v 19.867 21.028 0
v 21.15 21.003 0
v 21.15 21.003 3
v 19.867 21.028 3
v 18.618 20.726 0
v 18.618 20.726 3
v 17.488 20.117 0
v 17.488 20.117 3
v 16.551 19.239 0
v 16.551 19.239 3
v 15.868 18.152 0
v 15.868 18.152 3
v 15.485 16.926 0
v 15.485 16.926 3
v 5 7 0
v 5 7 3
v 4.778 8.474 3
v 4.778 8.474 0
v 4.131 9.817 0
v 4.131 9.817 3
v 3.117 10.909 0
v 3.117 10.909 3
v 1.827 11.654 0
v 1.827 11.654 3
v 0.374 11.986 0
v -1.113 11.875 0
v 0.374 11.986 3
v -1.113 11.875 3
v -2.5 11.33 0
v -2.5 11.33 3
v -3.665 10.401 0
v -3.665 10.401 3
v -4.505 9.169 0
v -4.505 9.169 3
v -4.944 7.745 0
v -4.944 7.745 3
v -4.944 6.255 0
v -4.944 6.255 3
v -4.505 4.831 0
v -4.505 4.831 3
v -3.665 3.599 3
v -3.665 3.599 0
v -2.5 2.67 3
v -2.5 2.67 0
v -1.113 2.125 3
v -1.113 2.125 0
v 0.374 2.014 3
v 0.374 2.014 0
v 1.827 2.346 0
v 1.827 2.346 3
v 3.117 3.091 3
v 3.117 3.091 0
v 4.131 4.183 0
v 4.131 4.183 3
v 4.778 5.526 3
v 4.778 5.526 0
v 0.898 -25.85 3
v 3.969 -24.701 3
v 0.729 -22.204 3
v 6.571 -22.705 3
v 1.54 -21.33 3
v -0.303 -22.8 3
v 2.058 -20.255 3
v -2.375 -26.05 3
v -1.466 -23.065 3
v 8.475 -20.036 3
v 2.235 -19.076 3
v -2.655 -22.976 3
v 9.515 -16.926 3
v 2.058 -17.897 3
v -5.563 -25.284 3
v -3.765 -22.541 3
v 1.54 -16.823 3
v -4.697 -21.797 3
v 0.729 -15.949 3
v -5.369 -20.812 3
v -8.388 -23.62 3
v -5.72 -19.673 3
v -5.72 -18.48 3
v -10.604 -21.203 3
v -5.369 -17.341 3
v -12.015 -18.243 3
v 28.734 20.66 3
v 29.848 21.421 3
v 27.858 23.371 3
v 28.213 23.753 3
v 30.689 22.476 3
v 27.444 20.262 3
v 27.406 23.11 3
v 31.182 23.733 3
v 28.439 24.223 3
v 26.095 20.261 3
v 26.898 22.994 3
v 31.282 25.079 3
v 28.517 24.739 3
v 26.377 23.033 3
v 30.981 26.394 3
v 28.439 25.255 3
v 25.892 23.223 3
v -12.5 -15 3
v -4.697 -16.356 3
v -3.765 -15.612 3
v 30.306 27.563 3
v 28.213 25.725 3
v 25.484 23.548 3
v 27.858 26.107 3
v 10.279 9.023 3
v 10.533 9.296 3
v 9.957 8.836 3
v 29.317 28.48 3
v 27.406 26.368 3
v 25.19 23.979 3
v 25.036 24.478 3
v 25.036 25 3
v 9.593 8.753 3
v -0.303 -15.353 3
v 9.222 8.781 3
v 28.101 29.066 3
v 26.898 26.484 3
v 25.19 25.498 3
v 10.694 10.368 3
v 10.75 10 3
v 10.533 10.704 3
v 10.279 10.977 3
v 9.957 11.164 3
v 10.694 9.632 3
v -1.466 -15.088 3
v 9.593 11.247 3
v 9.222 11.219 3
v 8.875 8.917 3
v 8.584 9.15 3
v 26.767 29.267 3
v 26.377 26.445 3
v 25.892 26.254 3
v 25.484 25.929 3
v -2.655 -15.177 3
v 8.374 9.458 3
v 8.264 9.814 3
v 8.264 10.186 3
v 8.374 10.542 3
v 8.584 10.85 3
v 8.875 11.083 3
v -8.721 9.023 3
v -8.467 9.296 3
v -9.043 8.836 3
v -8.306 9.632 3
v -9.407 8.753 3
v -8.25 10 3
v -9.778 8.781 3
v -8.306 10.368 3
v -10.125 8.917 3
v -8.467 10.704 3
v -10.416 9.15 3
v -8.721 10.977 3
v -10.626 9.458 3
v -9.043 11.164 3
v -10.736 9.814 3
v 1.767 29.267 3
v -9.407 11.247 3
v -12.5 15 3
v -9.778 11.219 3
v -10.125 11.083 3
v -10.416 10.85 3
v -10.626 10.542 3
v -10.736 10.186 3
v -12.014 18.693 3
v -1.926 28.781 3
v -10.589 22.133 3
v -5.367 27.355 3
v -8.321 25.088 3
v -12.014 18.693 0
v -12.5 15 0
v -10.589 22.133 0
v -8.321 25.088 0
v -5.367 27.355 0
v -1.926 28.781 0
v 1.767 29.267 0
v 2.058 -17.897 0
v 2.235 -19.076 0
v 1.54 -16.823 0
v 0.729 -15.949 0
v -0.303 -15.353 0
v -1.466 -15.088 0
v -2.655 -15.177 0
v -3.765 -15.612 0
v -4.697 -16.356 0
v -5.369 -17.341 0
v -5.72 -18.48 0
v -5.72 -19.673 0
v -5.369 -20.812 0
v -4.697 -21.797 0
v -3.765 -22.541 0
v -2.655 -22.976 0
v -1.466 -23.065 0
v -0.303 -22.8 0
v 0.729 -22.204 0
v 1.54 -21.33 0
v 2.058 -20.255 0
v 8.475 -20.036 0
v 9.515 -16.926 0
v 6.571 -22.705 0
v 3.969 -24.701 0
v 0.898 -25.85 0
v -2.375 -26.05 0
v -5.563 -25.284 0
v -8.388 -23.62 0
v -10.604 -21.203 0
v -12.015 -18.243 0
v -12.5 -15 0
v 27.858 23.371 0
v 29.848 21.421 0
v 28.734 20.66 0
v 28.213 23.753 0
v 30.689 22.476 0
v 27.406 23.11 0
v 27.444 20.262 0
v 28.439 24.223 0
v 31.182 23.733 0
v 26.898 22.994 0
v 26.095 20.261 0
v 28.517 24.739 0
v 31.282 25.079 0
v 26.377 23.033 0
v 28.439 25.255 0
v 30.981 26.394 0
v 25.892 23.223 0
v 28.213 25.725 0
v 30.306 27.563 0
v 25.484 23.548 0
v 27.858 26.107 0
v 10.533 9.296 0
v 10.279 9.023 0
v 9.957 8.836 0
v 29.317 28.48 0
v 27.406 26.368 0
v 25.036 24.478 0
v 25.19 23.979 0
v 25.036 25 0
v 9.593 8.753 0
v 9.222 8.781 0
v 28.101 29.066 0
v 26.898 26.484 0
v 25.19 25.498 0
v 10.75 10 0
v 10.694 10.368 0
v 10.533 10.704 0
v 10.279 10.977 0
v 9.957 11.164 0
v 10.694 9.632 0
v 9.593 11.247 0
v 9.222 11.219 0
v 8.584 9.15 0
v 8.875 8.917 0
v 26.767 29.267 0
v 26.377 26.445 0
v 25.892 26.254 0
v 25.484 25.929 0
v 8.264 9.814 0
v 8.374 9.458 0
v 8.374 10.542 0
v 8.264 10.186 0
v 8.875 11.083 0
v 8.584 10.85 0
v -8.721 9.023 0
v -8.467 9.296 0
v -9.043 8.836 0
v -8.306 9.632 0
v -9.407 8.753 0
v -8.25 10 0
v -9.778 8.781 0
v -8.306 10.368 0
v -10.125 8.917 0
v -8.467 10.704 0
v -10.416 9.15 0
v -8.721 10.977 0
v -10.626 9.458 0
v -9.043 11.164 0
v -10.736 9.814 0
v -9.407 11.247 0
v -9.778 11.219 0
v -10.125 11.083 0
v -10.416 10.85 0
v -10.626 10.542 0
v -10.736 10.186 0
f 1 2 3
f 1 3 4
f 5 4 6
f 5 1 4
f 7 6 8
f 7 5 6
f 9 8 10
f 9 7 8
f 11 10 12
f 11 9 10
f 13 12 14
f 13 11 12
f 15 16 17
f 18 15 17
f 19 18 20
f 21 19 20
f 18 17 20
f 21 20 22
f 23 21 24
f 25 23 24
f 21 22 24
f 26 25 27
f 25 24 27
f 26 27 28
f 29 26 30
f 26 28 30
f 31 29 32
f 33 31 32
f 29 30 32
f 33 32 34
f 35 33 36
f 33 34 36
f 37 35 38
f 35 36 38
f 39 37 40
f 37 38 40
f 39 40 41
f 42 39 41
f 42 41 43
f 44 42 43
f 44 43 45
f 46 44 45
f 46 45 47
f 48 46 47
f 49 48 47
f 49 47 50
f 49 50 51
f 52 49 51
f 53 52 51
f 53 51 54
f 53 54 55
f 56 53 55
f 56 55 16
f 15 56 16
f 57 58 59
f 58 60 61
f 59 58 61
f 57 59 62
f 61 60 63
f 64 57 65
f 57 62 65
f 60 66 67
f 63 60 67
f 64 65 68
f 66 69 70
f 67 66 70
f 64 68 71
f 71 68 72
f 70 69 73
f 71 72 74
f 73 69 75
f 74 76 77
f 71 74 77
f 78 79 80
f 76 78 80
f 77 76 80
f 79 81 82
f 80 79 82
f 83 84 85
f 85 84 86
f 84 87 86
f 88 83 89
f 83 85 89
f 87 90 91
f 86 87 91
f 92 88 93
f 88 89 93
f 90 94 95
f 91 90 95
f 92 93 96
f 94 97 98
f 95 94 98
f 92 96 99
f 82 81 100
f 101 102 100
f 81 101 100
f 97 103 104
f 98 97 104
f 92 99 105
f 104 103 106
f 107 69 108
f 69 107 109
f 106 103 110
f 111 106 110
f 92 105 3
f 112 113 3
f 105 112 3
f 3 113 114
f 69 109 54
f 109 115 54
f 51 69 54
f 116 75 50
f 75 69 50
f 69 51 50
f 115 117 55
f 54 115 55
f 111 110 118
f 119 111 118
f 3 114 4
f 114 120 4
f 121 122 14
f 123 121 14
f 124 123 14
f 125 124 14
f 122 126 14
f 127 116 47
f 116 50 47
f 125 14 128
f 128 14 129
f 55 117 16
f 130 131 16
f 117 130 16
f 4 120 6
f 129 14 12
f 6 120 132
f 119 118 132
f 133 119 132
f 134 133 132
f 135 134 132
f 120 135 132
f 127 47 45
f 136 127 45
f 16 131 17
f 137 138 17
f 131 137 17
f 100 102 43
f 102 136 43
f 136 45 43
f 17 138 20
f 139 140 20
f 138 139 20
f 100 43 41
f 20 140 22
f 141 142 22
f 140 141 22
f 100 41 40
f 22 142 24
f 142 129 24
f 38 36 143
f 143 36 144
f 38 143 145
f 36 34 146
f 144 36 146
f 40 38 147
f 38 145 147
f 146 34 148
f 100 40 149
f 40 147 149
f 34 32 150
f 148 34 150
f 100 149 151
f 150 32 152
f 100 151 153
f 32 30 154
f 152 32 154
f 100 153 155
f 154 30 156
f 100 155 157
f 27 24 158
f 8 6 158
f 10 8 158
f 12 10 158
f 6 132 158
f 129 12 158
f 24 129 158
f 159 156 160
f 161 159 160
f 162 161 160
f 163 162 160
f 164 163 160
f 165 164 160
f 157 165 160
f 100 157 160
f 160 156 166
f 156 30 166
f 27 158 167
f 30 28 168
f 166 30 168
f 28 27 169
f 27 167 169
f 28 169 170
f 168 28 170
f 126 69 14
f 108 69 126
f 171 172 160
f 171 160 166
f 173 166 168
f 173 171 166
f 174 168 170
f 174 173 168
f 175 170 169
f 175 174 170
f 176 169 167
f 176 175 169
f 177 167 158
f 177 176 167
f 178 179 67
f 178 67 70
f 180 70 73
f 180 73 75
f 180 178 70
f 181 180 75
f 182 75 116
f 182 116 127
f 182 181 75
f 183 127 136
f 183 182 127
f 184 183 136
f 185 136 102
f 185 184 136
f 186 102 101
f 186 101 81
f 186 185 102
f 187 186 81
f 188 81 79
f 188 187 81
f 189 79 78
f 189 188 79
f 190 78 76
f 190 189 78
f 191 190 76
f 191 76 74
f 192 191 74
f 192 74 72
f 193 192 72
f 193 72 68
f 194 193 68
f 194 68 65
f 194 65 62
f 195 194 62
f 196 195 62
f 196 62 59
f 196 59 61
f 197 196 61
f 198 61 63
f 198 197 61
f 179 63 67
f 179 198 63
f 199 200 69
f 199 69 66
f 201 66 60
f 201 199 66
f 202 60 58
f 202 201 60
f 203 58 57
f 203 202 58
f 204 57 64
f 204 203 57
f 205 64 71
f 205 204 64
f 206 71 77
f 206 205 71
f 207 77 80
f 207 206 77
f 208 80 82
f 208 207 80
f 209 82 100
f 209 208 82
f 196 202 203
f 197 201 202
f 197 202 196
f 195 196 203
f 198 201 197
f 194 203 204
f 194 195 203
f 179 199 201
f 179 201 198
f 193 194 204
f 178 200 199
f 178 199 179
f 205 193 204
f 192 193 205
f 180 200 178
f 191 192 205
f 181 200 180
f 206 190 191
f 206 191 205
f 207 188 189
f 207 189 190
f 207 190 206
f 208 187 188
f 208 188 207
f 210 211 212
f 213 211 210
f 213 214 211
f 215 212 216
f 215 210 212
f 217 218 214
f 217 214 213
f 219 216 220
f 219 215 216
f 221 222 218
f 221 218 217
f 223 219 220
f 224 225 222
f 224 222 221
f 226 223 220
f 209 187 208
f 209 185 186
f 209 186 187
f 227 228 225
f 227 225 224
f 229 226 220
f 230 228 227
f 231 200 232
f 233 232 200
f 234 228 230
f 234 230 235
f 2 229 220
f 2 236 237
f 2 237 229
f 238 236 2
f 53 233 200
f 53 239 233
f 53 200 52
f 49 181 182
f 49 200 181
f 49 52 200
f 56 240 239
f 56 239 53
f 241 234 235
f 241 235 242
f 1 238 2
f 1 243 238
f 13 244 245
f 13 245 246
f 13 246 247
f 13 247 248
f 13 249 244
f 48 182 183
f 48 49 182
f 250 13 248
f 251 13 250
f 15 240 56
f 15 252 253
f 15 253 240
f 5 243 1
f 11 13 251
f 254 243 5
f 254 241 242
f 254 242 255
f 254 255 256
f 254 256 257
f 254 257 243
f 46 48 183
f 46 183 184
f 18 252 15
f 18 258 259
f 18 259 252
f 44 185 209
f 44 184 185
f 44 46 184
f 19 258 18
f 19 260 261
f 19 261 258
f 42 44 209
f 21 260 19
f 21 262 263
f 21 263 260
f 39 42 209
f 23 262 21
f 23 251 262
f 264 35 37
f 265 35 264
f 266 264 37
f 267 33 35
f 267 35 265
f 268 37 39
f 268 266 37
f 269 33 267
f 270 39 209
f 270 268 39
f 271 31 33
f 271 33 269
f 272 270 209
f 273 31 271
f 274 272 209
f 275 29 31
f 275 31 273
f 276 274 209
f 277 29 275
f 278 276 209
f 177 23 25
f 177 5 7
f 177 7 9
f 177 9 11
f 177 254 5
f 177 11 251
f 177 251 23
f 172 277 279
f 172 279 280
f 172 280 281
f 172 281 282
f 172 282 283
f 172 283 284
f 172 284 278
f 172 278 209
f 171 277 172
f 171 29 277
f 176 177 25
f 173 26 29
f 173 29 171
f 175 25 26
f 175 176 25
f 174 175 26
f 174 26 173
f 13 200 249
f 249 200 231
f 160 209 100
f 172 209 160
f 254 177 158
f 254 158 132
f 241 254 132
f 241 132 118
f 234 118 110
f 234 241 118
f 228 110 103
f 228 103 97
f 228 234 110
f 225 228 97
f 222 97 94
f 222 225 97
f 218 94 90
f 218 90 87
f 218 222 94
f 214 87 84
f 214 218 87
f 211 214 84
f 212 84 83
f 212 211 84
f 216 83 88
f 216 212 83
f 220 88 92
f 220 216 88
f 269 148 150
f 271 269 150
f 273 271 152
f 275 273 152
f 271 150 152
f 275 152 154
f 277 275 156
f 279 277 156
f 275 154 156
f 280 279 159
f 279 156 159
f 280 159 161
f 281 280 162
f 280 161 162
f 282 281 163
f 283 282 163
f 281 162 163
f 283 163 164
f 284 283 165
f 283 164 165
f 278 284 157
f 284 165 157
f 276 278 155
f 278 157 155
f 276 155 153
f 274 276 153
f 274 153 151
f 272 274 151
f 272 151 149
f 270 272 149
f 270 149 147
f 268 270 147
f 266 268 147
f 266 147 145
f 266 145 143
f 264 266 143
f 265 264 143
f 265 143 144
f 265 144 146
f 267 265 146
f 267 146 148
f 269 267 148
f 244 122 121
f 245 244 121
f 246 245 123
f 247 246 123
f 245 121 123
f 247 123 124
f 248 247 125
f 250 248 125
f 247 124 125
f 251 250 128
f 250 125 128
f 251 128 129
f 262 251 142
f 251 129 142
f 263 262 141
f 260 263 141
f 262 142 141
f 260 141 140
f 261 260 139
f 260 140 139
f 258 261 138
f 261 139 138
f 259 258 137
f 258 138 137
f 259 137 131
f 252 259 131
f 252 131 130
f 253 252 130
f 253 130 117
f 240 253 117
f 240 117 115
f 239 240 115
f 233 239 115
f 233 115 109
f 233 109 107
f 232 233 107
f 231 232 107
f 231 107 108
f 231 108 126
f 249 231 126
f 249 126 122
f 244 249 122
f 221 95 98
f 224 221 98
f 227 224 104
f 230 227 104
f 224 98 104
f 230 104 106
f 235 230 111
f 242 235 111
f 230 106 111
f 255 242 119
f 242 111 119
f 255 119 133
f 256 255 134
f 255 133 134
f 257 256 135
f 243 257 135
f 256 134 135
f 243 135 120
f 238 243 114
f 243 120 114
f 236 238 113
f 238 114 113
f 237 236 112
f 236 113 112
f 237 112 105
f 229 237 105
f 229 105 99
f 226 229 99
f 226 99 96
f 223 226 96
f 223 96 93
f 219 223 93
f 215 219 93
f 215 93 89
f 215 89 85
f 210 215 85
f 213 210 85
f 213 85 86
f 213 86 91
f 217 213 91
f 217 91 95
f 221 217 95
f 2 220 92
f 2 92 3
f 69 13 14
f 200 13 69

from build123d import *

# Parameters (mm, degrees)
SKETCH3_R           = 4
BOSS_EXTRUDE4_DEPTH = 3
SKETCH5_R           = 1.25
SKETCH5_R_2         = 5
CUT_EXTRUDE2_DEPTH  = 43.952434096
SKETCH6_R           = 1.75
CUT_EXTRUDE3_DEPTH  = 43.952434096


with BuildPart() as part:
    # Sketch3 → Boss-Extrude4 (new body)
    with BuildSketch(Plane.XY):
        with BuildLine():
            Line((-12.5, -15), (-12.5, 15))
            ThreePointArc((-12.5, 15), (-8.321357206, 25.088136105), (1.766778898, 29.266778898))
            Line((1.766778898, 29.266778898), (26.766778898, 29.266778898))
            ThreePointArc((26.766778898, 29.266778898), (31.28229963, 24.401899264), (26.095015576, 20.260756249))
            Line((26.095015576, 20.260756249), (21.150345096, 21.00253374))
            ThreePointArc((21.150345096, 21.00253374), (17.488439715, 20.116539535), (15.48452884, 16.926104149))
            Line((15.48452884, 16.926104149), (9.51547116, -16.926104149))
            ThreePointArc((9.51547116, -16.926104149), (-2.374739058, -26.049783342), (-12.5, -15))
        make_face()
        with Locations((-1.764648859, -19.076420455)):
            Circle(SKETCH3_R, mode=Mode.SUBTRACT)
    extrude(amount=BOSS_EXTRUDE4_DEPTH)

    # Sketch5 → Cut-Extrude2 (cut, through all)
    with BuildSketch(Plane.XY.offset(3)):
        with Locations((-9.5, 10)):
            Circle(SKETCH5_R)
        with Locations((9.5, 10)):
            Circle(SKETCH5_R)
        with Locations((0, 7)):
            Circle(SKETCH5_R_2)
    extrude(amount=-CUT_EXTRUDE2_DEPTH, mode=Mode.SUBTRACT)

    # Sketch6 → Cut-Extrude3 (cut, through all)
    with BuildSketch(Plane.XY.offset(3)):
        with Locations((26.766778898, 24.738714008)):
            Circle(SKETCH6_R)
    extrude(amount=-CUT_EXTRUDE3_DEPTH, mode=Mode.SUBTRACT)


solid = part.part
